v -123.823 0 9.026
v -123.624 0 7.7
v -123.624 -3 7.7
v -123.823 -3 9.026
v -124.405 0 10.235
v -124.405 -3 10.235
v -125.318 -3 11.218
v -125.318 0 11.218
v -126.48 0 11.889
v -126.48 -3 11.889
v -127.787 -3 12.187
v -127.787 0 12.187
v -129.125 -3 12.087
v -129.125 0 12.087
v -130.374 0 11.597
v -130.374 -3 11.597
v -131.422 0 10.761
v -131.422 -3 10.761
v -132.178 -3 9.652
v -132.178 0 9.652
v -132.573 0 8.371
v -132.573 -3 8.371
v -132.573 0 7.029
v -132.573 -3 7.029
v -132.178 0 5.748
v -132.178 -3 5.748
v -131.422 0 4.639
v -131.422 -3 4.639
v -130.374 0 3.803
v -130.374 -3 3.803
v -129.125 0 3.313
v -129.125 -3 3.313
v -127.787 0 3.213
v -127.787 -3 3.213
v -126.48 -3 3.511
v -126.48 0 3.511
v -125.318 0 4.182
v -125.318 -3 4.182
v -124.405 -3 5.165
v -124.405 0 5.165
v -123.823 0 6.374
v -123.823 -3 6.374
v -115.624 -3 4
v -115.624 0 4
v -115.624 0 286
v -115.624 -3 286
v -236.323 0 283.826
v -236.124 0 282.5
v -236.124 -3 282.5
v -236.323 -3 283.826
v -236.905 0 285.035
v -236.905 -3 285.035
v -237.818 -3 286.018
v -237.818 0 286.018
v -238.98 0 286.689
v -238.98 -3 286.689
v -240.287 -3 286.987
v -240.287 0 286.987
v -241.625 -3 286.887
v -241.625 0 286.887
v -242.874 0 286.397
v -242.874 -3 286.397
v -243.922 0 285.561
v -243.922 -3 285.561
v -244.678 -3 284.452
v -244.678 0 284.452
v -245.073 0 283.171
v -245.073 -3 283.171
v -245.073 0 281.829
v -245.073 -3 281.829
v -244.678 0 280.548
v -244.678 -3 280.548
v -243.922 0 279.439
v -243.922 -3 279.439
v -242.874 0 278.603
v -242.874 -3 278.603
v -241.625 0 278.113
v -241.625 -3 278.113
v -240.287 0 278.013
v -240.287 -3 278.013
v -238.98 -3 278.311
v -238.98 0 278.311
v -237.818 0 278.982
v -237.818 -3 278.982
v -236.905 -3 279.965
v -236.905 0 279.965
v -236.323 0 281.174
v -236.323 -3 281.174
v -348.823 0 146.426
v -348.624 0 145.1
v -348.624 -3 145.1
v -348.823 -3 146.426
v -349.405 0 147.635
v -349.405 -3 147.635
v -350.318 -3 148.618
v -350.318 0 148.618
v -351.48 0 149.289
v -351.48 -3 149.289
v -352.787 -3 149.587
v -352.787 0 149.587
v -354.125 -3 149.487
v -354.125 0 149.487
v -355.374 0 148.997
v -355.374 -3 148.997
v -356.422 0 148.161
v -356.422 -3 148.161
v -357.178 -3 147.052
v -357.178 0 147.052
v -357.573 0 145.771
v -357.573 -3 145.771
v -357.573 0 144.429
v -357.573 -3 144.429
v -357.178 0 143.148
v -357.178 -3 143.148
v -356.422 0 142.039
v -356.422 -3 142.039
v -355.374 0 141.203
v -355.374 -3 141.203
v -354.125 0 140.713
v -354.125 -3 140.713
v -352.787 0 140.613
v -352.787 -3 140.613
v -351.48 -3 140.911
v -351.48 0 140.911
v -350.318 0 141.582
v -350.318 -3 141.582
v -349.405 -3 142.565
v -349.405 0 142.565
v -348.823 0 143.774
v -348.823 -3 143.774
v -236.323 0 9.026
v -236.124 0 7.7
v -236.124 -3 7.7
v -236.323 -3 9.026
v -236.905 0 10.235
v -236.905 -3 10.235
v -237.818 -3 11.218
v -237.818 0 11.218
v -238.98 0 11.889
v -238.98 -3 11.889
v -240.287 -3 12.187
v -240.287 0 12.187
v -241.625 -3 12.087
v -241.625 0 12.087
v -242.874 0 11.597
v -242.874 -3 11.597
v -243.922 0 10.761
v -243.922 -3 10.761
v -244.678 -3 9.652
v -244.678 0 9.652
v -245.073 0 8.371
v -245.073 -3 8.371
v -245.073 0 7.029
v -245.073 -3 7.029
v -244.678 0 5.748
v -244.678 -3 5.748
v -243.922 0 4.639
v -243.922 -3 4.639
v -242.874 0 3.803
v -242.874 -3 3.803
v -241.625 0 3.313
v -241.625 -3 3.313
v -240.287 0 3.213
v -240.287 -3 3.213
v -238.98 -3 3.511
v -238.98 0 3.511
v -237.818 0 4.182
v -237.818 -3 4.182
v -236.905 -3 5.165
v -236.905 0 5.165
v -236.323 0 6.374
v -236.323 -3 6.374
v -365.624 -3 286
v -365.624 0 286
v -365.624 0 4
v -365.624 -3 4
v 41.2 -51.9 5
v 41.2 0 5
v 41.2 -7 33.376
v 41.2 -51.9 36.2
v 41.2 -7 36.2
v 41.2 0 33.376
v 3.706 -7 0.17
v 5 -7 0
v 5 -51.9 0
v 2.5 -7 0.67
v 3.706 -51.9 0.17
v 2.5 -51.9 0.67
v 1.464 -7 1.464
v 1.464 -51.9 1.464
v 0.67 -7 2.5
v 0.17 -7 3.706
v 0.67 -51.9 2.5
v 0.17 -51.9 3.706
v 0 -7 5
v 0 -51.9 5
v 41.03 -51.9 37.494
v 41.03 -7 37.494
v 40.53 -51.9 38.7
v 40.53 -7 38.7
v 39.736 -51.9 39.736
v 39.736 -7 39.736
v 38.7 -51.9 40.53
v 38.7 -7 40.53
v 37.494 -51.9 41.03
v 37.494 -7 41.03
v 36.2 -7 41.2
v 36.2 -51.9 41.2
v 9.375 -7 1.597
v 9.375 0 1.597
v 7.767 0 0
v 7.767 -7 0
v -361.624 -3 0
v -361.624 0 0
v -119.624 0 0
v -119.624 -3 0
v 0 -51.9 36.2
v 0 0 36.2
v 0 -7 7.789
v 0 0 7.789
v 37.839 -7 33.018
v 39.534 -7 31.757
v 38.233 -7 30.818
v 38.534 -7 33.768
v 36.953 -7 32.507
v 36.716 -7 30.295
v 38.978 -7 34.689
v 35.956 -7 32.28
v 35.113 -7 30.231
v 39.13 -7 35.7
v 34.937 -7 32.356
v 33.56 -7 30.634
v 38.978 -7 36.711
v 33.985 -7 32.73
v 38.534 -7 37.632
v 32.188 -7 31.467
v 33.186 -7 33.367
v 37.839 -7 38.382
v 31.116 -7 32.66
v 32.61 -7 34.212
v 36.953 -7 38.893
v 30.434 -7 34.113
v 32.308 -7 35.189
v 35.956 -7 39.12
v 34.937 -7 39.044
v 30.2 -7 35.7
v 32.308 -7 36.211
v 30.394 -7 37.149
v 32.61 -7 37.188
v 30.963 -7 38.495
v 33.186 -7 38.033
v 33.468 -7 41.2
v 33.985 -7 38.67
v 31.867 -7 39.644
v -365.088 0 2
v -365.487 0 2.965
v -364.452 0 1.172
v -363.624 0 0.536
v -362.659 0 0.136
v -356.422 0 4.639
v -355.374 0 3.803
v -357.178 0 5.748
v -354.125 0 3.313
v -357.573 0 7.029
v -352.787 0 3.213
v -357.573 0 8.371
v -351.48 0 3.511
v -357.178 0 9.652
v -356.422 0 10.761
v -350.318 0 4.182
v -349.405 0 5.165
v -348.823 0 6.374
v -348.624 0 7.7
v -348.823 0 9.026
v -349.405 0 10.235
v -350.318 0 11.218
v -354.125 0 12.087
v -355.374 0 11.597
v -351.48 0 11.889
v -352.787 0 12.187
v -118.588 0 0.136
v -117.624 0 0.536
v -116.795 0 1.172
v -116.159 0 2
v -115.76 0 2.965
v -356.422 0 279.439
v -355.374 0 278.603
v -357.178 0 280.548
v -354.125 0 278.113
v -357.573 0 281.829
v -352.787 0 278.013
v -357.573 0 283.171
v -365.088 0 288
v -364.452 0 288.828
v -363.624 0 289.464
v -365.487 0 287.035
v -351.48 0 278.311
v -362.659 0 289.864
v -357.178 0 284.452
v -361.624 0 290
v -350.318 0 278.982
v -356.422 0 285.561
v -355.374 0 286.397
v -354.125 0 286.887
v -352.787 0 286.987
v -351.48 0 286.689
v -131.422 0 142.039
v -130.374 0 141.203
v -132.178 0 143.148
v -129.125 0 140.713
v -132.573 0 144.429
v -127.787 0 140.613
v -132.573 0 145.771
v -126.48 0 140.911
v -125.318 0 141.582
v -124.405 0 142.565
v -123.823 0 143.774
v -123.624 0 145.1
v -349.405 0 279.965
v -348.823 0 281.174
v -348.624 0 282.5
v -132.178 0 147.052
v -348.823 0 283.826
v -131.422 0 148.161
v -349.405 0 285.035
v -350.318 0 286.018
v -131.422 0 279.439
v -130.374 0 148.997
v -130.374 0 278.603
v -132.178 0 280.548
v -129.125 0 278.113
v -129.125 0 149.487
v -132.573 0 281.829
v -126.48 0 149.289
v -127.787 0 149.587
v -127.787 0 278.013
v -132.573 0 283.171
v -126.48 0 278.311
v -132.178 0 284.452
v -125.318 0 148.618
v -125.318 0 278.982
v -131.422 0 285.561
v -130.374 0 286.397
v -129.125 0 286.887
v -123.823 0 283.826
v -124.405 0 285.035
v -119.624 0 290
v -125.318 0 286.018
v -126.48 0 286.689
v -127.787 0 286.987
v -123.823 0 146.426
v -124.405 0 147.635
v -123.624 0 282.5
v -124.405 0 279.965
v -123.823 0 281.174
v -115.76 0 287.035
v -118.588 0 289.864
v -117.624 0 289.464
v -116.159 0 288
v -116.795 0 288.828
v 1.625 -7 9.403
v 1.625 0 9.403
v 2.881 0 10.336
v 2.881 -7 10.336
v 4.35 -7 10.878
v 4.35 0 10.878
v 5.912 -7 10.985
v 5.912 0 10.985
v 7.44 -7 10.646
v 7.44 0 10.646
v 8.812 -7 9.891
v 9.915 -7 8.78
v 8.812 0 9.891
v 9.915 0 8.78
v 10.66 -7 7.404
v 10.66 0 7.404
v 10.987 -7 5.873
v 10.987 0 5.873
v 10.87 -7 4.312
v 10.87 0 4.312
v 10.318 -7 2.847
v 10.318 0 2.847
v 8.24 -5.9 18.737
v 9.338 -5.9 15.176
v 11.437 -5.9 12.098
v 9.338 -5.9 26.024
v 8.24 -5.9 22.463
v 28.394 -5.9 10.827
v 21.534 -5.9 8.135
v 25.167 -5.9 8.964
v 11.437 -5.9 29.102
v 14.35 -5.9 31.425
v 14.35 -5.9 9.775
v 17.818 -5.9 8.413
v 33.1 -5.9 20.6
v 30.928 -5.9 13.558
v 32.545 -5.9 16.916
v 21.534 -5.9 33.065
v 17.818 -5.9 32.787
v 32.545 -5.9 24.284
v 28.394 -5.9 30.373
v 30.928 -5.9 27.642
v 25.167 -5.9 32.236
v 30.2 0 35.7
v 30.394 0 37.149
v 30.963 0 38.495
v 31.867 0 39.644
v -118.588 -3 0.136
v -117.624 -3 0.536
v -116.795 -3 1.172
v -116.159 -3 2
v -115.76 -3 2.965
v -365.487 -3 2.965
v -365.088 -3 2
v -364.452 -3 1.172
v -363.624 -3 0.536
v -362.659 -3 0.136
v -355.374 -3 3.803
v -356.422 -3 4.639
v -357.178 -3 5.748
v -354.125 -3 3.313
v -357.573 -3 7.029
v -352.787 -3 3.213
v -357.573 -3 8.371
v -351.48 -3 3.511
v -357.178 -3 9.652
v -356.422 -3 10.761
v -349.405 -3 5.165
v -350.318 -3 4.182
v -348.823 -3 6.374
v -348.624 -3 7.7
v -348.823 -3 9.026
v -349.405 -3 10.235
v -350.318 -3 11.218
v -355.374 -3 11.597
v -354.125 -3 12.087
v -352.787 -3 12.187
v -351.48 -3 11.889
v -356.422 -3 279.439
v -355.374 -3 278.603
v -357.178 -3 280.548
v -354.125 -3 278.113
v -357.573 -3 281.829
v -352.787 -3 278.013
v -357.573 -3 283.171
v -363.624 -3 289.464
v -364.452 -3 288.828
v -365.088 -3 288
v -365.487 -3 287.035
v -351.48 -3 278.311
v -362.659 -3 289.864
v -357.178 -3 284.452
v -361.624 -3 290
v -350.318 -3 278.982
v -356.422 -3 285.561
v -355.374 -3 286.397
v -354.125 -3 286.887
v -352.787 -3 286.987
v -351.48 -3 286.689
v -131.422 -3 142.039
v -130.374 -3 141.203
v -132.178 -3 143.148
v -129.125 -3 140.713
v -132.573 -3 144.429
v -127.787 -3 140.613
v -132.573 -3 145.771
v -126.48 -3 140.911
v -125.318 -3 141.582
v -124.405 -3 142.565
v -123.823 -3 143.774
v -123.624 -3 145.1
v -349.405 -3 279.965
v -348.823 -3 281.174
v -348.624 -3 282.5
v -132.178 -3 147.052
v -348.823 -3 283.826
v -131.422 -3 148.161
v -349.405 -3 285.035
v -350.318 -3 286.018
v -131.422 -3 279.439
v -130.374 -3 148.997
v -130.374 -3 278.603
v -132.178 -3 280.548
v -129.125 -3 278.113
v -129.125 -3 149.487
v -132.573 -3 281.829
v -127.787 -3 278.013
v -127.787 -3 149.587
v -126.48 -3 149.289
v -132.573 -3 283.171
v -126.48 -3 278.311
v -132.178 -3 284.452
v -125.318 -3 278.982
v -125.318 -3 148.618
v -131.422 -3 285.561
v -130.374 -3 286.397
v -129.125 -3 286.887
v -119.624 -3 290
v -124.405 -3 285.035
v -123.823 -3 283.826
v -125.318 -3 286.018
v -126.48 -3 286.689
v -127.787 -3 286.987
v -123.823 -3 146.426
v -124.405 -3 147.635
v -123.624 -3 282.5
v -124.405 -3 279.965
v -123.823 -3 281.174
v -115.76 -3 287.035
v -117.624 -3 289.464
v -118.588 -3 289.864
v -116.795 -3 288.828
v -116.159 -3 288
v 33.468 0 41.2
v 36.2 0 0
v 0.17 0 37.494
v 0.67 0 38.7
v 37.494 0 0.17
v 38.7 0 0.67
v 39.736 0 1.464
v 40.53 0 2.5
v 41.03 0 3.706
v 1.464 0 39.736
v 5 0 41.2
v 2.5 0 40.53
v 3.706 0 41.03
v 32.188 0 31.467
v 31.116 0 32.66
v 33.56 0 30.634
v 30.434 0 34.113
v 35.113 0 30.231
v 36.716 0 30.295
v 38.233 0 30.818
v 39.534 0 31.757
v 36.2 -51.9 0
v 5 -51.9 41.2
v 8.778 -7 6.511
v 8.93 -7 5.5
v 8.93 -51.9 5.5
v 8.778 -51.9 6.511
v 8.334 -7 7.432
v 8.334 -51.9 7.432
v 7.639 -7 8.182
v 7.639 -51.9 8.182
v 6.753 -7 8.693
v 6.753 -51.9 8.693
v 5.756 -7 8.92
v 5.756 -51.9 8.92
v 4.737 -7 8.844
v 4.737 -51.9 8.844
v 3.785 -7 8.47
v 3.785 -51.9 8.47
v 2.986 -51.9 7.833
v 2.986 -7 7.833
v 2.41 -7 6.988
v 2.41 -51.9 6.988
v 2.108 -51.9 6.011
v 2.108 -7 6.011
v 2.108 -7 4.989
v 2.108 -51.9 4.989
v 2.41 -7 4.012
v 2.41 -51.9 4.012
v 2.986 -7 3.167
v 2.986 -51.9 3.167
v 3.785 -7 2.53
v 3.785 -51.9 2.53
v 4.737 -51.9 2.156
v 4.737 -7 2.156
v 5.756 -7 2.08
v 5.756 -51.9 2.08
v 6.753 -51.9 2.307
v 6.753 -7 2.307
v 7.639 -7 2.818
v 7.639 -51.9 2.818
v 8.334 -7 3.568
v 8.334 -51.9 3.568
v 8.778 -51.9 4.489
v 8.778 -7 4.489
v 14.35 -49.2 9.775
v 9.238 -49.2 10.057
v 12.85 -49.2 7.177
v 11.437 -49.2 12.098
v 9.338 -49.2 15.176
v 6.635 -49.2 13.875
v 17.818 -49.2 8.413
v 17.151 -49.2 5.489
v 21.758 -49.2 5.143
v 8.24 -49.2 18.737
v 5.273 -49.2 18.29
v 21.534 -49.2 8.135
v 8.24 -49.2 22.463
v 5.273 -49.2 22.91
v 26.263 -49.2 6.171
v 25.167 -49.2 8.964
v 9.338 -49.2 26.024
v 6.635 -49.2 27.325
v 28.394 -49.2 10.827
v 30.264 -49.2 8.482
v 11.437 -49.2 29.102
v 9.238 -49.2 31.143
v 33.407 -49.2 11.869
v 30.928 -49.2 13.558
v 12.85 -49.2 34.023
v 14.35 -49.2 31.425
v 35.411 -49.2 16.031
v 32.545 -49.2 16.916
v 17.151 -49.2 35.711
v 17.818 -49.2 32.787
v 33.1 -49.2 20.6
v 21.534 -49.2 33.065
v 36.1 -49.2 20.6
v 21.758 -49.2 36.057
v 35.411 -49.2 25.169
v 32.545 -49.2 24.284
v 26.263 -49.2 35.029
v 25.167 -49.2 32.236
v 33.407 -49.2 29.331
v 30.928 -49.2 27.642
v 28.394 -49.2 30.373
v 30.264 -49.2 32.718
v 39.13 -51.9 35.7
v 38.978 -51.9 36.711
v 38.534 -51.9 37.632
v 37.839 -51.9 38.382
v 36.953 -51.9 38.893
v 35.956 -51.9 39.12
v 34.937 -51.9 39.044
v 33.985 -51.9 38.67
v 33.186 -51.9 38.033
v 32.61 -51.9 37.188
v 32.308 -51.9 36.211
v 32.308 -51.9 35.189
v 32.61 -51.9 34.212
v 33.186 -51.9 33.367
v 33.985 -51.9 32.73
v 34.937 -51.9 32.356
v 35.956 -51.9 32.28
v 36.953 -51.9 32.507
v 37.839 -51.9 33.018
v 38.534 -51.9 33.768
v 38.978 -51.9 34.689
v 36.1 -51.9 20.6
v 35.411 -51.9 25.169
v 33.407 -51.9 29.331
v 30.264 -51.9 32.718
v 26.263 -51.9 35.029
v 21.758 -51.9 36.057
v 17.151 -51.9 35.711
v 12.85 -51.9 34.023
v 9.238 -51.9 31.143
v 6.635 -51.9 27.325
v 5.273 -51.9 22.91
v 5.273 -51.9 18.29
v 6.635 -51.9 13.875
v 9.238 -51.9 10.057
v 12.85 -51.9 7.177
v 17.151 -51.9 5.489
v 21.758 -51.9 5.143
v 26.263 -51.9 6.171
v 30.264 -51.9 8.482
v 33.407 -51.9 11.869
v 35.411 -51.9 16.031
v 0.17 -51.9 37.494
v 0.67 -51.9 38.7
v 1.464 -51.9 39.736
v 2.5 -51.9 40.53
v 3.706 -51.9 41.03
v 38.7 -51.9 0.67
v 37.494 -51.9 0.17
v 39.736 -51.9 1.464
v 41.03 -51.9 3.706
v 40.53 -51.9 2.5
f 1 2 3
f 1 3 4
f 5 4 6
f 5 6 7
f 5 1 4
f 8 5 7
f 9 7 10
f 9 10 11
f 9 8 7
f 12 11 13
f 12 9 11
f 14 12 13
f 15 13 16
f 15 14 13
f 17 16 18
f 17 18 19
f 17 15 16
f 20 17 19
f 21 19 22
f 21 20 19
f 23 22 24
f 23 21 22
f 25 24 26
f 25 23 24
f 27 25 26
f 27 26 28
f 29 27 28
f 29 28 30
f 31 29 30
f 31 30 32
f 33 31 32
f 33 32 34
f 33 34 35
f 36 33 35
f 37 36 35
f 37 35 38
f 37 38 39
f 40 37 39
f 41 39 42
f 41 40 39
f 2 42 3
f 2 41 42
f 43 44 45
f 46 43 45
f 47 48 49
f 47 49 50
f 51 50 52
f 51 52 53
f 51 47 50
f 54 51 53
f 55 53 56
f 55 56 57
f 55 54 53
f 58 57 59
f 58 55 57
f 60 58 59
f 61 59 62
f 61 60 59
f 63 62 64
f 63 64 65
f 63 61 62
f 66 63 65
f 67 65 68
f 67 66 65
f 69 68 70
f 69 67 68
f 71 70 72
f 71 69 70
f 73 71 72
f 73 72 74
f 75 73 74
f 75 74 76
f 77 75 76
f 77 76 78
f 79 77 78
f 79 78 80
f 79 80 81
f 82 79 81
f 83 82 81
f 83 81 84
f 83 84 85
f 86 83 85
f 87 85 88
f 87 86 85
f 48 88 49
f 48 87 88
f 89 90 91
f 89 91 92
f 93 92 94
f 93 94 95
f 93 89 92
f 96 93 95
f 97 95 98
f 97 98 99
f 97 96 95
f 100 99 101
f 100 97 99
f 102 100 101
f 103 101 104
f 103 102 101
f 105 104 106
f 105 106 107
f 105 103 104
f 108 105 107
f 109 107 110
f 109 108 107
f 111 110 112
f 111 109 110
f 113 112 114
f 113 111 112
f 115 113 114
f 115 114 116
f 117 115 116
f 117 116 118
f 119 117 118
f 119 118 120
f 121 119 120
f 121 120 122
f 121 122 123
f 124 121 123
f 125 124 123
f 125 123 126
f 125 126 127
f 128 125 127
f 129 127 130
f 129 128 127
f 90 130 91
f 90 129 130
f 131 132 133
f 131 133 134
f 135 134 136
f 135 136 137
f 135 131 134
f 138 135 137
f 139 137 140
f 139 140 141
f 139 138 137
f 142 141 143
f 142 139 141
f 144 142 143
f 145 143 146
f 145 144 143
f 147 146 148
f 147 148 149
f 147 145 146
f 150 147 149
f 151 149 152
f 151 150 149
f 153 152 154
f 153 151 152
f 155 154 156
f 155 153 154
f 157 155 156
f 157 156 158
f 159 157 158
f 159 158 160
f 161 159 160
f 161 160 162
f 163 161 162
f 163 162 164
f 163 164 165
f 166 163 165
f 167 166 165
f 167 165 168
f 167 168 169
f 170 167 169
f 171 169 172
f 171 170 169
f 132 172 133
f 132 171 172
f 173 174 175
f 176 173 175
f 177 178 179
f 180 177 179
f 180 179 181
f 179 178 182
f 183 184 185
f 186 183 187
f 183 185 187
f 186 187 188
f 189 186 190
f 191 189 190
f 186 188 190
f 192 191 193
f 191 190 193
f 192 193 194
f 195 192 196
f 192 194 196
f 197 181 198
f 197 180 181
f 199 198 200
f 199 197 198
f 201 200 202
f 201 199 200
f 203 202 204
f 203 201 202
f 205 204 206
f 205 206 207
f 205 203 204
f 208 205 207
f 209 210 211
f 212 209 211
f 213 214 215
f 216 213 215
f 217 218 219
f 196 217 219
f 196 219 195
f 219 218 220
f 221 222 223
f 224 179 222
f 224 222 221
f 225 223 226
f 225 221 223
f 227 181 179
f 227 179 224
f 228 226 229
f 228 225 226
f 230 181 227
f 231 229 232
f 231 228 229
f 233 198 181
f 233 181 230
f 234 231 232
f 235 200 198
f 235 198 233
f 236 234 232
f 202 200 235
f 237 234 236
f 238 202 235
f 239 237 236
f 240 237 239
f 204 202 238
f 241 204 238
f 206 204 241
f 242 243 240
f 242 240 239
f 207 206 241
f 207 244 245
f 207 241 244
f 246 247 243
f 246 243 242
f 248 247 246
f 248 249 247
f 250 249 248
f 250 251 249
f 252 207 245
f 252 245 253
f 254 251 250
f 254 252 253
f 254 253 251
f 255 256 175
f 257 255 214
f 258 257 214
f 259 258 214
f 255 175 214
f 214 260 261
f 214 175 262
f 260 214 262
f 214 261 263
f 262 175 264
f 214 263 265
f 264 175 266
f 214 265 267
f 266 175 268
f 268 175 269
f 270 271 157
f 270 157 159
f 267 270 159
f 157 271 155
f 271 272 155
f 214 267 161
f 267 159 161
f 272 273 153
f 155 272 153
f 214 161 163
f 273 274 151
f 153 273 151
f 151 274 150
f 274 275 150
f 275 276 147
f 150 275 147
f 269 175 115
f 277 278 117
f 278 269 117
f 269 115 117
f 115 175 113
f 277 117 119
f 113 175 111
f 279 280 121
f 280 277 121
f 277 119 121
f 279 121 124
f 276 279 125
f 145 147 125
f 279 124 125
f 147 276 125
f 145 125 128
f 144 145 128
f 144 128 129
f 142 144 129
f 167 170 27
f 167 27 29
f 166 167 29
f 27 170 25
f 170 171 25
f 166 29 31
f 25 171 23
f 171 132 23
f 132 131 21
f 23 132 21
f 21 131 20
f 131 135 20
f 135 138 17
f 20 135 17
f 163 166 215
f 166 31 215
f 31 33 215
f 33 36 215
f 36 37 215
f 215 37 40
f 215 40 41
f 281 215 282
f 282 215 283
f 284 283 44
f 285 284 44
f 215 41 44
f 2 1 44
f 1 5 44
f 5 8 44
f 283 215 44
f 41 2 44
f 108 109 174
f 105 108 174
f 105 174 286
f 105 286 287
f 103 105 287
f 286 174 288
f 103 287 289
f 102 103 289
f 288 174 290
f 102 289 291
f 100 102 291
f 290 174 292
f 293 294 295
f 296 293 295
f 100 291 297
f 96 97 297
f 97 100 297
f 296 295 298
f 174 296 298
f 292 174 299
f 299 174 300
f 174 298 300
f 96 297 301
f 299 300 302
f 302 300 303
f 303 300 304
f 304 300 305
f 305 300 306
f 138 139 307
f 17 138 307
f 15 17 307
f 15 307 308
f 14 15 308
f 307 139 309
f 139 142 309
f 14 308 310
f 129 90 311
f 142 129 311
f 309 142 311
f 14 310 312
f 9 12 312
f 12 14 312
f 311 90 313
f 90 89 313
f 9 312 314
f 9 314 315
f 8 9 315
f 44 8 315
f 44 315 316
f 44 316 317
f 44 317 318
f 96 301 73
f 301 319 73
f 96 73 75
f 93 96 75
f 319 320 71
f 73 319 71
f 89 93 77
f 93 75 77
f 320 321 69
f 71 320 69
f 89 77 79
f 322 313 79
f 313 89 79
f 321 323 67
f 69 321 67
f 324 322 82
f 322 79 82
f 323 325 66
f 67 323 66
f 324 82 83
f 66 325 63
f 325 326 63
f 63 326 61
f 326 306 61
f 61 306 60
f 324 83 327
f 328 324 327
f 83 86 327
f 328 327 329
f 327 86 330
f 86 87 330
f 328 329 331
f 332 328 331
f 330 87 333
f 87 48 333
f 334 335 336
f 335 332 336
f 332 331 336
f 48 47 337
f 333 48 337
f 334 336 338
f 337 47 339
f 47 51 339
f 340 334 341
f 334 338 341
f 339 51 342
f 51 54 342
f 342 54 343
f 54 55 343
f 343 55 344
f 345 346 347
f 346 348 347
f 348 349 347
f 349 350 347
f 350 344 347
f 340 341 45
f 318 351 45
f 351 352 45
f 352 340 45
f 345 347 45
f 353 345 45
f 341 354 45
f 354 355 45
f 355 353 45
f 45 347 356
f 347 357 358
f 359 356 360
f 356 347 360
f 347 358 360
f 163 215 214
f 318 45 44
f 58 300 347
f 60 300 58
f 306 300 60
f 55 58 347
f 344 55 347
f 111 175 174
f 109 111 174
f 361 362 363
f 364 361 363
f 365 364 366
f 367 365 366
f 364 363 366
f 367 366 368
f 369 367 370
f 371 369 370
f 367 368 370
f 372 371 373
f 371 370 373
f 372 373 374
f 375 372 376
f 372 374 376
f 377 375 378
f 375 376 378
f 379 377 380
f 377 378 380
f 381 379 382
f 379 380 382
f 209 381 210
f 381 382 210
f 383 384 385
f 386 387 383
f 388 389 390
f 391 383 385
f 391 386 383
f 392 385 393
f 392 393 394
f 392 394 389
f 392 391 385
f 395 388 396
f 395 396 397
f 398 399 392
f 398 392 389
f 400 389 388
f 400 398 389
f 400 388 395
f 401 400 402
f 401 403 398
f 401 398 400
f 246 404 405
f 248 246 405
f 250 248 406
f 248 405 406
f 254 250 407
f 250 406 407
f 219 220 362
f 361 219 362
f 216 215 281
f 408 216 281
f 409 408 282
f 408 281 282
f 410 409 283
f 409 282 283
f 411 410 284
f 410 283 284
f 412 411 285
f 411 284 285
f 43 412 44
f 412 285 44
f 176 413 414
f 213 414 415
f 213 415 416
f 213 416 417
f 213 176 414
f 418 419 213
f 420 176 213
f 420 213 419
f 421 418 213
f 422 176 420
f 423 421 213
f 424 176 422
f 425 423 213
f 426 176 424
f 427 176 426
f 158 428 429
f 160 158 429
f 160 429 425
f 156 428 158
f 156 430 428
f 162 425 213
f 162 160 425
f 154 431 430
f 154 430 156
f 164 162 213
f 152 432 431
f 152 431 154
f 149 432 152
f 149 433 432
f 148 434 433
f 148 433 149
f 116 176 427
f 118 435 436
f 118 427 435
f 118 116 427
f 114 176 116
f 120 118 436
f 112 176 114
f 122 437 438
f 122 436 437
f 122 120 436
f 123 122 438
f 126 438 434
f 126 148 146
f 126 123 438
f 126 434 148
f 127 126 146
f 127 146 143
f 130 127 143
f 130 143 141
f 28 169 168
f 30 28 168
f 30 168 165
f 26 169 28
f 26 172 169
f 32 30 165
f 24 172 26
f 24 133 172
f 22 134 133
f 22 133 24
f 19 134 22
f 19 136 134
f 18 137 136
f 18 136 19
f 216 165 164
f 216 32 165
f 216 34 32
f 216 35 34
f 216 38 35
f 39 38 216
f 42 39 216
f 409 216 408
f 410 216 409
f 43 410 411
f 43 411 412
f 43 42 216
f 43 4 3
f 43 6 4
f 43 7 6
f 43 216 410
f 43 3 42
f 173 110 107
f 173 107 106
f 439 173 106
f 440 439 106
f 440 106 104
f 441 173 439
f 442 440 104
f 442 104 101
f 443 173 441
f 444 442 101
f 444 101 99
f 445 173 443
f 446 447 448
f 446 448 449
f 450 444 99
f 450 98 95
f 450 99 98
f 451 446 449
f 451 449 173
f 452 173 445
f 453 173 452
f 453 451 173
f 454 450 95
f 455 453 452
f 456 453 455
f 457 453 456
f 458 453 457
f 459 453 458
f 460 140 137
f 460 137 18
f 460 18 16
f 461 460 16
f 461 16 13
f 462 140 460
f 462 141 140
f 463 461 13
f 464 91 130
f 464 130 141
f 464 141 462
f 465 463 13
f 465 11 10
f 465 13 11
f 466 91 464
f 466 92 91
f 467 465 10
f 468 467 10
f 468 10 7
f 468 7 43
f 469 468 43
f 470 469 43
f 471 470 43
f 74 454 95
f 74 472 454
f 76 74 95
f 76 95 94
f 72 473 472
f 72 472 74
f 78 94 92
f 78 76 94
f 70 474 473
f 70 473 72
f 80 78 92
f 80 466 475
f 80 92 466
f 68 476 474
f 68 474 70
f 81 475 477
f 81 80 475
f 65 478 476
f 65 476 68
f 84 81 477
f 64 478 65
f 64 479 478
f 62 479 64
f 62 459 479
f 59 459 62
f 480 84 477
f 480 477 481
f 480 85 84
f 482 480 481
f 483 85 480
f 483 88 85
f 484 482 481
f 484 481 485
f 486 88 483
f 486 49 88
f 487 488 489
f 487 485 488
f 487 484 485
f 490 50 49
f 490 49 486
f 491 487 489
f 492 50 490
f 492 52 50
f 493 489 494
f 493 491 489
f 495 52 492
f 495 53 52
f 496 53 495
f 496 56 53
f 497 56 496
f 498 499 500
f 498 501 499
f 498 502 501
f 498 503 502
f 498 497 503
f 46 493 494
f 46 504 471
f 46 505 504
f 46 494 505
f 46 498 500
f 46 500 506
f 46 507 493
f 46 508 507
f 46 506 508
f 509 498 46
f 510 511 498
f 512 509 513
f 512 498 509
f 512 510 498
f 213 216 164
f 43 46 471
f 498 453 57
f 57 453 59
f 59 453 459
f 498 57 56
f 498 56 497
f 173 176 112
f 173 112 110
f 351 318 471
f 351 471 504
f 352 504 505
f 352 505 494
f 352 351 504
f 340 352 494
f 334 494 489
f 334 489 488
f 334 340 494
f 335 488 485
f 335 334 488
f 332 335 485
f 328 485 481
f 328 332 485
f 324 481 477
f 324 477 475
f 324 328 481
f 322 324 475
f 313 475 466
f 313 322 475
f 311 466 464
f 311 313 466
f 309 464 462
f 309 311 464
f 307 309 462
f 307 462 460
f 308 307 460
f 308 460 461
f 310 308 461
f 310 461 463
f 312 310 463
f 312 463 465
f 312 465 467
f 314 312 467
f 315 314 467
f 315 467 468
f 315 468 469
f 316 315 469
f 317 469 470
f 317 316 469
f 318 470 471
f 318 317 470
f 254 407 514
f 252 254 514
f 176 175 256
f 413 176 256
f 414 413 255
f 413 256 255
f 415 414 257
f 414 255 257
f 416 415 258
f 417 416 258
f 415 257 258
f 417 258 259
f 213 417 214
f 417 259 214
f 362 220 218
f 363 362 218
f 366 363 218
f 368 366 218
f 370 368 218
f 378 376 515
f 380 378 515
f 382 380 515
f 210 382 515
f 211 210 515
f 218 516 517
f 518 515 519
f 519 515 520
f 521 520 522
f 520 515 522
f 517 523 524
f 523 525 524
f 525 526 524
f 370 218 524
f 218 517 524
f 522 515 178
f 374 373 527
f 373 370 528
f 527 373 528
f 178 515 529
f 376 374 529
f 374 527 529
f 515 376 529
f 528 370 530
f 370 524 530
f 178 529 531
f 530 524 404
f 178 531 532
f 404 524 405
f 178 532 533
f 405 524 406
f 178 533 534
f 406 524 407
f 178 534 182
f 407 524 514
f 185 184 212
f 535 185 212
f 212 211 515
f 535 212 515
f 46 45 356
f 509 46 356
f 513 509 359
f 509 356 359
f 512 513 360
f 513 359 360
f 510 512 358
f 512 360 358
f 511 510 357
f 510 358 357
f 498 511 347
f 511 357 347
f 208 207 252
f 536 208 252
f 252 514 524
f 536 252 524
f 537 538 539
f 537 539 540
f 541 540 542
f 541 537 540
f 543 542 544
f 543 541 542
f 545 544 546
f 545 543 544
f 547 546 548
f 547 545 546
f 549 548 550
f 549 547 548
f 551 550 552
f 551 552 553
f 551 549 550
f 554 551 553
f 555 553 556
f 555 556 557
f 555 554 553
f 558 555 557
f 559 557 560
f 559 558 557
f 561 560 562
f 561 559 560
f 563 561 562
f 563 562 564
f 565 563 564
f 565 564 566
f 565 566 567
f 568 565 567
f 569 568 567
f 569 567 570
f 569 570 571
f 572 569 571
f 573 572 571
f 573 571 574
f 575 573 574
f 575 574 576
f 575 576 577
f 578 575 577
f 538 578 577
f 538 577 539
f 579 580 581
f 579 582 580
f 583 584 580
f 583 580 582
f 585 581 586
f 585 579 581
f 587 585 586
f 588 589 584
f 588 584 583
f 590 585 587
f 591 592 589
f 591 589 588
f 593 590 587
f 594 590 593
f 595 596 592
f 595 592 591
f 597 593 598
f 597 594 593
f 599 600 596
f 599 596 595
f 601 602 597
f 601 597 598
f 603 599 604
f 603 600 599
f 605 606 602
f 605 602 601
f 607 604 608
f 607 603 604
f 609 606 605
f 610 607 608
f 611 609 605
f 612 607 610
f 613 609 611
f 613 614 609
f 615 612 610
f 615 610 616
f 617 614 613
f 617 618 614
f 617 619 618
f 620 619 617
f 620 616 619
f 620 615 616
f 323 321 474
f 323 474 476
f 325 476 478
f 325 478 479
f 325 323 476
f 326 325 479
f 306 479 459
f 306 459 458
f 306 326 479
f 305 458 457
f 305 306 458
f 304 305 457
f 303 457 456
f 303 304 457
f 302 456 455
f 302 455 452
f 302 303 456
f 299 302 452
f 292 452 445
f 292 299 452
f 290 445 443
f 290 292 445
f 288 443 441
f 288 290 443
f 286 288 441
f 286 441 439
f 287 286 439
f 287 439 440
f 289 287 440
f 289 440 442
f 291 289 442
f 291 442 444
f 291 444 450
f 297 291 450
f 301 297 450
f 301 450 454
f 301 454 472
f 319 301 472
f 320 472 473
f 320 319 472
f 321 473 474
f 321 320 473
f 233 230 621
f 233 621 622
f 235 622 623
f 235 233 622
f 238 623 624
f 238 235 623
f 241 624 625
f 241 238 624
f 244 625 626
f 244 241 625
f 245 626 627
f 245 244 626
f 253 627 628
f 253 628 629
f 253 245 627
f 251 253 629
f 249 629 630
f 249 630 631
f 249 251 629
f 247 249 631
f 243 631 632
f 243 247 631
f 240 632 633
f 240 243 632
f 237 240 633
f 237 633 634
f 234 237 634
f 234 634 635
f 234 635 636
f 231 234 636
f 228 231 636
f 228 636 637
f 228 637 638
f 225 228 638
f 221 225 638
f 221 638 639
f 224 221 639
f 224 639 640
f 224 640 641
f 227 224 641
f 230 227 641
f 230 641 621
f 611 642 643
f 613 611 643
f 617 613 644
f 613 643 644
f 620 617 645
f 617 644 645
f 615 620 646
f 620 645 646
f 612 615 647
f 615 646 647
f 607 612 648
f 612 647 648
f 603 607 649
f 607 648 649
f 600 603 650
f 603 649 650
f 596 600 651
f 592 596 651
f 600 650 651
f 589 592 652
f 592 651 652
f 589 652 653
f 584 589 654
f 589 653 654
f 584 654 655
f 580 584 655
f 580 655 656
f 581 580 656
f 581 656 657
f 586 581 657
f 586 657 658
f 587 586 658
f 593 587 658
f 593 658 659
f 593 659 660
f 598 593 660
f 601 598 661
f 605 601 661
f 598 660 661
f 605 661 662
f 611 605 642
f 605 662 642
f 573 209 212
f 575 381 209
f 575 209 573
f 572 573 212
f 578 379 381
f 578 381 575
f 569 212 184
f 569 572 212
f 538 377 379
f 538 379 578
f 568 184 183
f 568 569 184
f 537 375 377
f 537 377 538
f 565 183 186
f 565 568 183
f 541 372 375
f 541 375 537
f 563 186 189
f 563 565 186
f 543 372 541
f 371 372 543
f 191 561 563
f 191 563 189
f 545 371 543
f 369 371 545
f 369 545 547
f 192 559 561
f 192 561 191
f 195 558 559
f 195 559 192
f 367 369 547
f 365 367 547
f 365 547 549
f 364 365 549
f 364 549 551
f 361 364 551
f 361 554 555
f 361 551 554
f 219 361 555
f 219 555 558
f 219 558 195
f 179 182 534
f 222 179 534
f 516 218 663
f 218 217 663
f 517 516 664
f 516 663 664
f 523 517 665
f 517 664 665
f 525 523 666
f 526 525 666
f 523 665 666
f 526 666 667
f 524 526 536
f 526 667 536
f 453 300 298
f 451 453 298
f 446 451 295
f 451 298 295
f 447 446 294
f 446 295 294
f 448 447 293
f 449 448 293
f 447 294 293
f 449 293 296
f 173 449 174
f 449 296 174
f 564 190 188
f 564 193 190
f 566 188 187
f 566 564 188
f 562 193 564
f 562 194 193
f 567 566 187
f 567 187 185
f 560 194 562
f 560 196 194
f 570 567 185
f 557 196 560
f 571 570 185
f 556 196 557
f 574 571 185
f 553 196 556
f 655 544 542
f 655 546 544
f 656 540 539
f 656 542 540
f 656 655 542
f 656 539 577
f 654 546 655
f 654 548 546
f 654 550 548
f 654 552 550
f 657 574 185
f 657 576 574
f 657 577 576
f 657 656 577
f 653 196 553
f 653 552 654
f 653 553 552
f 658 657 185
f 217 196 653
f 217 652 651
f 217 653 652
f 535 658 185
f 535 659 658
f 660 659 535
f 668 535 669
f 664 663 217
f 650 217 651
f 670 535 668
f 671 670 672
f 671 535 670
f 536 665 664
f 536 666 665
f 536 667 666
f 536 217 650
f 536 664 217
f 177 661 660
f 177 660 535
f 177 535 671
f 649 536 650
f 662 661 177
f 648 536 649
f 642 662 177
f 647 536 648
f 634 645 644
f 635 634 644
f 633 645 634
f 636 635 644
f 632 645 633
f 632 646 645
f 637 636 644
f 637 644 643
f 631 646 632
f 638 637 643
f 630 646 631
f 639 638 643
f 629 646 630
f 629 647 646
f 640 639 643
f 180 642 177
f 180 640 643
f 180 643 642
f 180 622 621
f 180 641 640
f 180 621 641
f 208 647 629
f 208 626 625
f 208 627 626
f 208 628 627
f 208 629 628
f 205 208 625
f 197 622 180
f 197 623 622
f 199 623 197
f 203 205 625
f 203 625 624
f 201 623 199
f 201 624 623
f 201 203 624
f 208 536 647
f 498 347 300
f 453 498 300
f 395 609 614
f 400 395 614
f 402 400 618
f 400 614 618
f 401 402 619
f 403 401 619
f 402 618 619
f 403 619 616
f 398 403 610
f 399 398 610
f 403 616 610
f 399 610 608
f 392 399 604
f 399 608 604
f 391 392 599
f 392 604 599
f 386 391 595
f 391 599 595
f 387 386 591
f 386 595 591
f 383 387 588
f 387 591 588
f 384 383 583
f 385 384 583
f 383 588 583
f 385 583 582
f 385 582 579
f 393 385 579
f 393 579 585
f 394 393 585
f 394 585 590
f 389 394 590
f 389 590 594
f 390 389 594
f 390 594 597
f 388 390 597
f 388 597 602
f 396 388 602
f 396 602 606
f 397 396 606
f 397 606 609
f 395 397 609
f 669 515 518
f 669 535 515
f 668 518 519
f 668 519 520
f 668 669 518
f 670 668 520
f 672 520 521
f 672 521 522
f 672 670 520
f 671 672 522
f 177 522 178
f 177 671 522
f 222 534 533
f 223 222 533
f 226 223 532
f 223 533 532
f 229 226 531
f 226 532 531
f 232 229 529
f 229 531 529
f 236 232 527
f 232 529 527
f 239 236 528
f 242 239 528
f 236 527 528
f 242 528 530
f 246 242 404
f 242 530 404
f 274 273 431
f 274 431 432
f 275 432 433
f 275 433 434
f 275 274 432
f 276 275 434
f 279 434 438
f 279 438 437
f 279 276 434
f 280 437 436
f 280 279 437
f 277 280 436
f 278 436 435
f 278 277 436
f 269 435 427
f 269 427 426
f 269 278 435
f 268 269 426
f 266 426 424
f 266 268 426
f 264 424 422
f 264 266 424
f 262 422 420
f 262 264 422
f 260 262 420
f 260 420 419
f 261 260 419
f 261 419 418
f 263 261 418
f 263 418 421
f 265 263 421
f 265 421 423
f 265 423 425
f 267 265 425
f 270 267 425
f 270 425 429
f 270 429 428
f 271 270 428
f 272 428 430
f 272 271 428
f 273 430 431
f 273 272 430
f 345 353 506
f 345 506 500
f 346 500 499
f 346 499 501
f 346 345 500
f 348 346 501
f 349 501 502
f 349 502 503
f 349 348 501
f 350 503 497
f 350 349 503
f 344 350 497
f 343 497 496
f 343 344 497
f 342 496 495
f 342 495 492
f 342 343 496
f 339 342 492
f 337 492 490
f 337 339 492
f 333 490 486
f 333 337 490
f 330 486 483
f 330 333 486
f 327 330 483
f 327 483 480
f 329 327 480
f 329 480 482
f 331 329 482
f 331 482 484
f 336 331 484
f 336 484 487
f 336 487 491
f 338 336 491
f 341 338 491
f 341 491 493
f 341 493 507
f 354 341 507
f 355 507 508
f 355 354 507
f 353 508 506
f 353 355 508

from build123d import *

# Parameters (mm, degrees)
F0_R      = 3.43
F1_DEPTH  = 51.9
F2_R      = 3.43
F3_DEPTH  = 7
F4_R      = 12.5
F5_DEPTH  = 46
F6_R      = 5
F7_R      = 15.5
F7_R_2    = 12.5
F8_DEPTH  = 2.7
F9_R      = 4.5
F10_DEPTH = 3


with BuildPart() as f1:
    # F0 (on Front) → F1 (new body)
    with BuildSketch(Plane.XZ):
        with BuildLine():
            Line((0, 5.5), (0, 0))
            Line((0, 0), (5.5, 0))
            ThreePointArc((5.5, 0), (1.6109127035, 1.6109127035), (0, 5.5))
        make_face()
        with BuildLine():
            ThreePointArc((35.7, 41.2), (39.5890872965, 39.5890872965), (41.2, 35.7))
            Line((41.2, 35.7), (41.2, 41.2))
            Line((41.2, 41.2), (35.7, 41.2))
        make_face()
        with BuildLine():
            ThreePointArc((0, 5.5), (1.6109127035, 1.6109127035), (5.5, 0))
            ThreePointArc((5.5, 0), (9.3890872965, 1.6109127035), (11, 5.5))
            ThreePointArc((11, 5.5), (5.5, 11), (0, 5.5))
        make_face()
        with Locations((5.5, 5.5)):
            Circle(F0_R, mode=Mode.SUBTRACT)
        with BuildLine():
            ThreePointArc((35.7, 41.2), (31.8109127035, 31.8109127035), (41.2, 35.7))
            ThreePointArc((41.2, 35.7), (39.5890872965, 39.5890872965), (35.7, 41.2))
        make_face()
        with Locations((35.7, 35.7)):
            Circle(F0_R, mode=Mode.SUBTRACT)
        with BuildLine():
            ThreePointArc((11, 5.5), (9.3890872965, 1.6109127035), (5.5, 0))
            Line((5.5, 0), (41.2, 0))
            Line((41.2, 0), (41.2, 35.7))
            ThreePointArc((41.2, 35.7), (31.8109127035, 31.8109127035), (35.7, 41.2))
            Line((35.7, 41.2), (0, 41.2))
            Line((0, 41.2), (0, 5.5))
            ThreePointArc((0, 5.5), (5.5, 11), (11, 5.5))
        make_face()
    extrude(amount=F1_DEPTH)

    # F2 (on face) → F3 (cut)
    with BuildSketch(Plane(origin=(0, 0, 0), x_dir=(-1, 0, 0), z_dir=(0, 1, 0))):
        with BuildLine():
            Line((7.8442875928, 0), (0, 7.7894779942))
            Line((0, 7.7894779942), (0, 5.5))
            ThreePointArc((0, 5.5), (-3.3861839358, 0.4224236444), (-9.3751933261, 1.5970681936))
            Line((-9.3751933261, 1.5970681936), (0, -7.7114948072))
            Line((0, -7.7114948072), (7.8442875928, 0))
        make_face()
        with BuildLine():
            Line((-49.0428739703, 41.0014221254), (-39.5339500675, 31.7565463259))
            ThreePointArc((-39.5339500675, 31.7565463259), (-40.7960276298, 37.7689375042), (-35.7, 41.2))
            Line((-35.7, 41.2), (-33.4677347493, 41.2))
            Line((-33.4677347493, 41.2), (-41.2, 48.7143546343))
            Line((-41.2, 48.7143546343), (-49.0428739703, 41.0014221254))
        make_face()
        with BuildLine():
            ThreePointArc((0, 5.5), (-0.4223598428, 7.6136628005), (-1.6245710669, 9.4026978598))
            ThreePointArc((-1.6245710669, 9.4026978598), (-9.4028148349, 9.3753111313), (-9.3751933261, 1.5970681936))
            ThreePointArc((-9.3751933261, 1.5970681936), (-3.3861839358, 0.4224236444), (0, 5.5))
        make_face()
        with Locations((-5.5, 5.5)):
            Circle(F2_R, mode=Mode.SUBTRACT)
        with BuildLine():
            ThreePointArc((-39.5339500675, 31.7565463259), (-33.5595240449, 30.6336045668), (-30.2, 35.7))
            ThreePointArc((-30.2, 35.7), (-30.633832164, 37.8410145859), (-31.8668885298, 39.6442688115))
            ThreePointArc((-31.8668885298, 39.6442688115), (-33.6316043008, 40.7962475638), (-35.7, 41.2))
            ThreePointArc((-35.7, 41.2), (-40.7960276298, 37.7689375042), (-39.5339500675, 31.7565463259))
        make_face()
        with Locations((-35.7, 35.7)):
            Circle(F2_R, mode=Mode.SUBTRACT)
        with Locations((-5.5, 5.5)):
            Circle(F2_R)
        with Locations((-35.7, 35.7)):
            Circle(F2_R)
        with BuildLine():
            Line((0, 5.5), (0, 7.7894779942))
            Line((0, 7.7894779942), (-1.6245710669, 9.4026978598))
            ThreePointArc((-1.6245710669, 9.4026978598), (-0.4223598428, 7.6136628005), (0, 5.5))
        make_face()
        with BuildLine():
            ThreePointArc((-35.7, 41.2), (-33.6316043008, 40.7962475638), (-31.8668885298, 39.6442688115))
            Line((-31.8668885298, 39.6442688115), (-33.4677347493, 41.2))
            Line((-33.4677347493, 41.2), (-35.7, 41.2))
        make_face()
    extrude(amount=-F3_DEPTH, mode=Mode.SUBTRACT)

    # F4 (on face) → F5 (cut)
    with BuildSketch(Plane.XZ.offset(51.9)):
        with Locations((20.6, 20.6)):
            Circle(F4_R)
    extrude(amount=-F5_DEPTH, mode=Mode.SUBTRACT)

    # F6
    f6_edges = [f1.edges().sort_by_distance(p)[0] for p in [
        (41.2, -25.95, 0),
        (0, -25.95, 41.2),
        (41.2, -29.45, 41.2),
        (0, -29.45, 0),
    ]]
    fillet(f6_edges, radius=F6_R)

    # F7 (on face) → F8 (cut)
    with BuildSketch(Plane.XZ.offset(51.9)):
        with Locations((20.6, 20.6)):
            Circle(F7_R)
        with Locations((20.6, 20.6)):
            Circle(F7_R_2, mode=Mode.SUBTRACT)
    extrude(amount=-F8_DEPTH, mode=Mode.SUBTRACT)


with BuildPart() as f10:
    # F9 (on Front) → F10 (new body)
    with BuildSketch(Plane.XZ):
        with BuildLine():
            ThreePointArc((-365.6235651445, 4), (-364.4519922692, 1.1715728753), (-361.6235651445, 0))
            Line((-361.6235651445, 0), (-119.6235651445, 0))
            ThreePointArc((-119.6235651445, 0), (-116.7951380197, 1.1715728753), (-115.6235651445, 4))
            Line((-115.6235651445, 4), (-115.6235651445, 286))
            ThreePointArc((-115.6235651445, 286), (-116.7951380197, 288.8284271247), (-119.6235651445, 290))
            Line((-119.6235651445, 290), (-361.6235651445, 290))
            ThreePointArc((-361.6235651445, 290), (-364.4519922692, 288.8284271247), (-365.6235651445, 286))
            Line((-365.6235651445, 286), (-365.6235651445, 4))
        make_face()
        with Locations((-353.1235651445, 7.7)):
            Circle(F9_R, mode=Mode.SUBTRACT)
        with Locations((-240.6235651445, 7.7)):
            Circle(F9_R, mode=Mode.SUBTRACT)
        with Locations((-128.1235651445, 7.7)):
            Circle(F9_R, mode=Mode.SUBTRACT)
        with Locations((-353.1235651445, 145.1)):
            Circle(F9_R, mode=Mode.SUBTRACT)
        with Locations((-353.1235651445, 282.5)):
            Circle(F9_R, mode=Mode.SUBTRACT)
        with Locations((-128.1235651445, 145.1)):
            Circle(F9_R, mode=Mode.SUBTRACT)
        with Locations((-240.6235651445, 282.5)):
            Circle(F9_R, mode=Mode.SUBTRACT)
        with Locations((-128.1235651445, 282.5)):
            Circle(F9_R, mode=Mode.SUBTRACT)
    extrude(amount=F10_DEPTH)


solid = Compound([f1.part, f10.part])
